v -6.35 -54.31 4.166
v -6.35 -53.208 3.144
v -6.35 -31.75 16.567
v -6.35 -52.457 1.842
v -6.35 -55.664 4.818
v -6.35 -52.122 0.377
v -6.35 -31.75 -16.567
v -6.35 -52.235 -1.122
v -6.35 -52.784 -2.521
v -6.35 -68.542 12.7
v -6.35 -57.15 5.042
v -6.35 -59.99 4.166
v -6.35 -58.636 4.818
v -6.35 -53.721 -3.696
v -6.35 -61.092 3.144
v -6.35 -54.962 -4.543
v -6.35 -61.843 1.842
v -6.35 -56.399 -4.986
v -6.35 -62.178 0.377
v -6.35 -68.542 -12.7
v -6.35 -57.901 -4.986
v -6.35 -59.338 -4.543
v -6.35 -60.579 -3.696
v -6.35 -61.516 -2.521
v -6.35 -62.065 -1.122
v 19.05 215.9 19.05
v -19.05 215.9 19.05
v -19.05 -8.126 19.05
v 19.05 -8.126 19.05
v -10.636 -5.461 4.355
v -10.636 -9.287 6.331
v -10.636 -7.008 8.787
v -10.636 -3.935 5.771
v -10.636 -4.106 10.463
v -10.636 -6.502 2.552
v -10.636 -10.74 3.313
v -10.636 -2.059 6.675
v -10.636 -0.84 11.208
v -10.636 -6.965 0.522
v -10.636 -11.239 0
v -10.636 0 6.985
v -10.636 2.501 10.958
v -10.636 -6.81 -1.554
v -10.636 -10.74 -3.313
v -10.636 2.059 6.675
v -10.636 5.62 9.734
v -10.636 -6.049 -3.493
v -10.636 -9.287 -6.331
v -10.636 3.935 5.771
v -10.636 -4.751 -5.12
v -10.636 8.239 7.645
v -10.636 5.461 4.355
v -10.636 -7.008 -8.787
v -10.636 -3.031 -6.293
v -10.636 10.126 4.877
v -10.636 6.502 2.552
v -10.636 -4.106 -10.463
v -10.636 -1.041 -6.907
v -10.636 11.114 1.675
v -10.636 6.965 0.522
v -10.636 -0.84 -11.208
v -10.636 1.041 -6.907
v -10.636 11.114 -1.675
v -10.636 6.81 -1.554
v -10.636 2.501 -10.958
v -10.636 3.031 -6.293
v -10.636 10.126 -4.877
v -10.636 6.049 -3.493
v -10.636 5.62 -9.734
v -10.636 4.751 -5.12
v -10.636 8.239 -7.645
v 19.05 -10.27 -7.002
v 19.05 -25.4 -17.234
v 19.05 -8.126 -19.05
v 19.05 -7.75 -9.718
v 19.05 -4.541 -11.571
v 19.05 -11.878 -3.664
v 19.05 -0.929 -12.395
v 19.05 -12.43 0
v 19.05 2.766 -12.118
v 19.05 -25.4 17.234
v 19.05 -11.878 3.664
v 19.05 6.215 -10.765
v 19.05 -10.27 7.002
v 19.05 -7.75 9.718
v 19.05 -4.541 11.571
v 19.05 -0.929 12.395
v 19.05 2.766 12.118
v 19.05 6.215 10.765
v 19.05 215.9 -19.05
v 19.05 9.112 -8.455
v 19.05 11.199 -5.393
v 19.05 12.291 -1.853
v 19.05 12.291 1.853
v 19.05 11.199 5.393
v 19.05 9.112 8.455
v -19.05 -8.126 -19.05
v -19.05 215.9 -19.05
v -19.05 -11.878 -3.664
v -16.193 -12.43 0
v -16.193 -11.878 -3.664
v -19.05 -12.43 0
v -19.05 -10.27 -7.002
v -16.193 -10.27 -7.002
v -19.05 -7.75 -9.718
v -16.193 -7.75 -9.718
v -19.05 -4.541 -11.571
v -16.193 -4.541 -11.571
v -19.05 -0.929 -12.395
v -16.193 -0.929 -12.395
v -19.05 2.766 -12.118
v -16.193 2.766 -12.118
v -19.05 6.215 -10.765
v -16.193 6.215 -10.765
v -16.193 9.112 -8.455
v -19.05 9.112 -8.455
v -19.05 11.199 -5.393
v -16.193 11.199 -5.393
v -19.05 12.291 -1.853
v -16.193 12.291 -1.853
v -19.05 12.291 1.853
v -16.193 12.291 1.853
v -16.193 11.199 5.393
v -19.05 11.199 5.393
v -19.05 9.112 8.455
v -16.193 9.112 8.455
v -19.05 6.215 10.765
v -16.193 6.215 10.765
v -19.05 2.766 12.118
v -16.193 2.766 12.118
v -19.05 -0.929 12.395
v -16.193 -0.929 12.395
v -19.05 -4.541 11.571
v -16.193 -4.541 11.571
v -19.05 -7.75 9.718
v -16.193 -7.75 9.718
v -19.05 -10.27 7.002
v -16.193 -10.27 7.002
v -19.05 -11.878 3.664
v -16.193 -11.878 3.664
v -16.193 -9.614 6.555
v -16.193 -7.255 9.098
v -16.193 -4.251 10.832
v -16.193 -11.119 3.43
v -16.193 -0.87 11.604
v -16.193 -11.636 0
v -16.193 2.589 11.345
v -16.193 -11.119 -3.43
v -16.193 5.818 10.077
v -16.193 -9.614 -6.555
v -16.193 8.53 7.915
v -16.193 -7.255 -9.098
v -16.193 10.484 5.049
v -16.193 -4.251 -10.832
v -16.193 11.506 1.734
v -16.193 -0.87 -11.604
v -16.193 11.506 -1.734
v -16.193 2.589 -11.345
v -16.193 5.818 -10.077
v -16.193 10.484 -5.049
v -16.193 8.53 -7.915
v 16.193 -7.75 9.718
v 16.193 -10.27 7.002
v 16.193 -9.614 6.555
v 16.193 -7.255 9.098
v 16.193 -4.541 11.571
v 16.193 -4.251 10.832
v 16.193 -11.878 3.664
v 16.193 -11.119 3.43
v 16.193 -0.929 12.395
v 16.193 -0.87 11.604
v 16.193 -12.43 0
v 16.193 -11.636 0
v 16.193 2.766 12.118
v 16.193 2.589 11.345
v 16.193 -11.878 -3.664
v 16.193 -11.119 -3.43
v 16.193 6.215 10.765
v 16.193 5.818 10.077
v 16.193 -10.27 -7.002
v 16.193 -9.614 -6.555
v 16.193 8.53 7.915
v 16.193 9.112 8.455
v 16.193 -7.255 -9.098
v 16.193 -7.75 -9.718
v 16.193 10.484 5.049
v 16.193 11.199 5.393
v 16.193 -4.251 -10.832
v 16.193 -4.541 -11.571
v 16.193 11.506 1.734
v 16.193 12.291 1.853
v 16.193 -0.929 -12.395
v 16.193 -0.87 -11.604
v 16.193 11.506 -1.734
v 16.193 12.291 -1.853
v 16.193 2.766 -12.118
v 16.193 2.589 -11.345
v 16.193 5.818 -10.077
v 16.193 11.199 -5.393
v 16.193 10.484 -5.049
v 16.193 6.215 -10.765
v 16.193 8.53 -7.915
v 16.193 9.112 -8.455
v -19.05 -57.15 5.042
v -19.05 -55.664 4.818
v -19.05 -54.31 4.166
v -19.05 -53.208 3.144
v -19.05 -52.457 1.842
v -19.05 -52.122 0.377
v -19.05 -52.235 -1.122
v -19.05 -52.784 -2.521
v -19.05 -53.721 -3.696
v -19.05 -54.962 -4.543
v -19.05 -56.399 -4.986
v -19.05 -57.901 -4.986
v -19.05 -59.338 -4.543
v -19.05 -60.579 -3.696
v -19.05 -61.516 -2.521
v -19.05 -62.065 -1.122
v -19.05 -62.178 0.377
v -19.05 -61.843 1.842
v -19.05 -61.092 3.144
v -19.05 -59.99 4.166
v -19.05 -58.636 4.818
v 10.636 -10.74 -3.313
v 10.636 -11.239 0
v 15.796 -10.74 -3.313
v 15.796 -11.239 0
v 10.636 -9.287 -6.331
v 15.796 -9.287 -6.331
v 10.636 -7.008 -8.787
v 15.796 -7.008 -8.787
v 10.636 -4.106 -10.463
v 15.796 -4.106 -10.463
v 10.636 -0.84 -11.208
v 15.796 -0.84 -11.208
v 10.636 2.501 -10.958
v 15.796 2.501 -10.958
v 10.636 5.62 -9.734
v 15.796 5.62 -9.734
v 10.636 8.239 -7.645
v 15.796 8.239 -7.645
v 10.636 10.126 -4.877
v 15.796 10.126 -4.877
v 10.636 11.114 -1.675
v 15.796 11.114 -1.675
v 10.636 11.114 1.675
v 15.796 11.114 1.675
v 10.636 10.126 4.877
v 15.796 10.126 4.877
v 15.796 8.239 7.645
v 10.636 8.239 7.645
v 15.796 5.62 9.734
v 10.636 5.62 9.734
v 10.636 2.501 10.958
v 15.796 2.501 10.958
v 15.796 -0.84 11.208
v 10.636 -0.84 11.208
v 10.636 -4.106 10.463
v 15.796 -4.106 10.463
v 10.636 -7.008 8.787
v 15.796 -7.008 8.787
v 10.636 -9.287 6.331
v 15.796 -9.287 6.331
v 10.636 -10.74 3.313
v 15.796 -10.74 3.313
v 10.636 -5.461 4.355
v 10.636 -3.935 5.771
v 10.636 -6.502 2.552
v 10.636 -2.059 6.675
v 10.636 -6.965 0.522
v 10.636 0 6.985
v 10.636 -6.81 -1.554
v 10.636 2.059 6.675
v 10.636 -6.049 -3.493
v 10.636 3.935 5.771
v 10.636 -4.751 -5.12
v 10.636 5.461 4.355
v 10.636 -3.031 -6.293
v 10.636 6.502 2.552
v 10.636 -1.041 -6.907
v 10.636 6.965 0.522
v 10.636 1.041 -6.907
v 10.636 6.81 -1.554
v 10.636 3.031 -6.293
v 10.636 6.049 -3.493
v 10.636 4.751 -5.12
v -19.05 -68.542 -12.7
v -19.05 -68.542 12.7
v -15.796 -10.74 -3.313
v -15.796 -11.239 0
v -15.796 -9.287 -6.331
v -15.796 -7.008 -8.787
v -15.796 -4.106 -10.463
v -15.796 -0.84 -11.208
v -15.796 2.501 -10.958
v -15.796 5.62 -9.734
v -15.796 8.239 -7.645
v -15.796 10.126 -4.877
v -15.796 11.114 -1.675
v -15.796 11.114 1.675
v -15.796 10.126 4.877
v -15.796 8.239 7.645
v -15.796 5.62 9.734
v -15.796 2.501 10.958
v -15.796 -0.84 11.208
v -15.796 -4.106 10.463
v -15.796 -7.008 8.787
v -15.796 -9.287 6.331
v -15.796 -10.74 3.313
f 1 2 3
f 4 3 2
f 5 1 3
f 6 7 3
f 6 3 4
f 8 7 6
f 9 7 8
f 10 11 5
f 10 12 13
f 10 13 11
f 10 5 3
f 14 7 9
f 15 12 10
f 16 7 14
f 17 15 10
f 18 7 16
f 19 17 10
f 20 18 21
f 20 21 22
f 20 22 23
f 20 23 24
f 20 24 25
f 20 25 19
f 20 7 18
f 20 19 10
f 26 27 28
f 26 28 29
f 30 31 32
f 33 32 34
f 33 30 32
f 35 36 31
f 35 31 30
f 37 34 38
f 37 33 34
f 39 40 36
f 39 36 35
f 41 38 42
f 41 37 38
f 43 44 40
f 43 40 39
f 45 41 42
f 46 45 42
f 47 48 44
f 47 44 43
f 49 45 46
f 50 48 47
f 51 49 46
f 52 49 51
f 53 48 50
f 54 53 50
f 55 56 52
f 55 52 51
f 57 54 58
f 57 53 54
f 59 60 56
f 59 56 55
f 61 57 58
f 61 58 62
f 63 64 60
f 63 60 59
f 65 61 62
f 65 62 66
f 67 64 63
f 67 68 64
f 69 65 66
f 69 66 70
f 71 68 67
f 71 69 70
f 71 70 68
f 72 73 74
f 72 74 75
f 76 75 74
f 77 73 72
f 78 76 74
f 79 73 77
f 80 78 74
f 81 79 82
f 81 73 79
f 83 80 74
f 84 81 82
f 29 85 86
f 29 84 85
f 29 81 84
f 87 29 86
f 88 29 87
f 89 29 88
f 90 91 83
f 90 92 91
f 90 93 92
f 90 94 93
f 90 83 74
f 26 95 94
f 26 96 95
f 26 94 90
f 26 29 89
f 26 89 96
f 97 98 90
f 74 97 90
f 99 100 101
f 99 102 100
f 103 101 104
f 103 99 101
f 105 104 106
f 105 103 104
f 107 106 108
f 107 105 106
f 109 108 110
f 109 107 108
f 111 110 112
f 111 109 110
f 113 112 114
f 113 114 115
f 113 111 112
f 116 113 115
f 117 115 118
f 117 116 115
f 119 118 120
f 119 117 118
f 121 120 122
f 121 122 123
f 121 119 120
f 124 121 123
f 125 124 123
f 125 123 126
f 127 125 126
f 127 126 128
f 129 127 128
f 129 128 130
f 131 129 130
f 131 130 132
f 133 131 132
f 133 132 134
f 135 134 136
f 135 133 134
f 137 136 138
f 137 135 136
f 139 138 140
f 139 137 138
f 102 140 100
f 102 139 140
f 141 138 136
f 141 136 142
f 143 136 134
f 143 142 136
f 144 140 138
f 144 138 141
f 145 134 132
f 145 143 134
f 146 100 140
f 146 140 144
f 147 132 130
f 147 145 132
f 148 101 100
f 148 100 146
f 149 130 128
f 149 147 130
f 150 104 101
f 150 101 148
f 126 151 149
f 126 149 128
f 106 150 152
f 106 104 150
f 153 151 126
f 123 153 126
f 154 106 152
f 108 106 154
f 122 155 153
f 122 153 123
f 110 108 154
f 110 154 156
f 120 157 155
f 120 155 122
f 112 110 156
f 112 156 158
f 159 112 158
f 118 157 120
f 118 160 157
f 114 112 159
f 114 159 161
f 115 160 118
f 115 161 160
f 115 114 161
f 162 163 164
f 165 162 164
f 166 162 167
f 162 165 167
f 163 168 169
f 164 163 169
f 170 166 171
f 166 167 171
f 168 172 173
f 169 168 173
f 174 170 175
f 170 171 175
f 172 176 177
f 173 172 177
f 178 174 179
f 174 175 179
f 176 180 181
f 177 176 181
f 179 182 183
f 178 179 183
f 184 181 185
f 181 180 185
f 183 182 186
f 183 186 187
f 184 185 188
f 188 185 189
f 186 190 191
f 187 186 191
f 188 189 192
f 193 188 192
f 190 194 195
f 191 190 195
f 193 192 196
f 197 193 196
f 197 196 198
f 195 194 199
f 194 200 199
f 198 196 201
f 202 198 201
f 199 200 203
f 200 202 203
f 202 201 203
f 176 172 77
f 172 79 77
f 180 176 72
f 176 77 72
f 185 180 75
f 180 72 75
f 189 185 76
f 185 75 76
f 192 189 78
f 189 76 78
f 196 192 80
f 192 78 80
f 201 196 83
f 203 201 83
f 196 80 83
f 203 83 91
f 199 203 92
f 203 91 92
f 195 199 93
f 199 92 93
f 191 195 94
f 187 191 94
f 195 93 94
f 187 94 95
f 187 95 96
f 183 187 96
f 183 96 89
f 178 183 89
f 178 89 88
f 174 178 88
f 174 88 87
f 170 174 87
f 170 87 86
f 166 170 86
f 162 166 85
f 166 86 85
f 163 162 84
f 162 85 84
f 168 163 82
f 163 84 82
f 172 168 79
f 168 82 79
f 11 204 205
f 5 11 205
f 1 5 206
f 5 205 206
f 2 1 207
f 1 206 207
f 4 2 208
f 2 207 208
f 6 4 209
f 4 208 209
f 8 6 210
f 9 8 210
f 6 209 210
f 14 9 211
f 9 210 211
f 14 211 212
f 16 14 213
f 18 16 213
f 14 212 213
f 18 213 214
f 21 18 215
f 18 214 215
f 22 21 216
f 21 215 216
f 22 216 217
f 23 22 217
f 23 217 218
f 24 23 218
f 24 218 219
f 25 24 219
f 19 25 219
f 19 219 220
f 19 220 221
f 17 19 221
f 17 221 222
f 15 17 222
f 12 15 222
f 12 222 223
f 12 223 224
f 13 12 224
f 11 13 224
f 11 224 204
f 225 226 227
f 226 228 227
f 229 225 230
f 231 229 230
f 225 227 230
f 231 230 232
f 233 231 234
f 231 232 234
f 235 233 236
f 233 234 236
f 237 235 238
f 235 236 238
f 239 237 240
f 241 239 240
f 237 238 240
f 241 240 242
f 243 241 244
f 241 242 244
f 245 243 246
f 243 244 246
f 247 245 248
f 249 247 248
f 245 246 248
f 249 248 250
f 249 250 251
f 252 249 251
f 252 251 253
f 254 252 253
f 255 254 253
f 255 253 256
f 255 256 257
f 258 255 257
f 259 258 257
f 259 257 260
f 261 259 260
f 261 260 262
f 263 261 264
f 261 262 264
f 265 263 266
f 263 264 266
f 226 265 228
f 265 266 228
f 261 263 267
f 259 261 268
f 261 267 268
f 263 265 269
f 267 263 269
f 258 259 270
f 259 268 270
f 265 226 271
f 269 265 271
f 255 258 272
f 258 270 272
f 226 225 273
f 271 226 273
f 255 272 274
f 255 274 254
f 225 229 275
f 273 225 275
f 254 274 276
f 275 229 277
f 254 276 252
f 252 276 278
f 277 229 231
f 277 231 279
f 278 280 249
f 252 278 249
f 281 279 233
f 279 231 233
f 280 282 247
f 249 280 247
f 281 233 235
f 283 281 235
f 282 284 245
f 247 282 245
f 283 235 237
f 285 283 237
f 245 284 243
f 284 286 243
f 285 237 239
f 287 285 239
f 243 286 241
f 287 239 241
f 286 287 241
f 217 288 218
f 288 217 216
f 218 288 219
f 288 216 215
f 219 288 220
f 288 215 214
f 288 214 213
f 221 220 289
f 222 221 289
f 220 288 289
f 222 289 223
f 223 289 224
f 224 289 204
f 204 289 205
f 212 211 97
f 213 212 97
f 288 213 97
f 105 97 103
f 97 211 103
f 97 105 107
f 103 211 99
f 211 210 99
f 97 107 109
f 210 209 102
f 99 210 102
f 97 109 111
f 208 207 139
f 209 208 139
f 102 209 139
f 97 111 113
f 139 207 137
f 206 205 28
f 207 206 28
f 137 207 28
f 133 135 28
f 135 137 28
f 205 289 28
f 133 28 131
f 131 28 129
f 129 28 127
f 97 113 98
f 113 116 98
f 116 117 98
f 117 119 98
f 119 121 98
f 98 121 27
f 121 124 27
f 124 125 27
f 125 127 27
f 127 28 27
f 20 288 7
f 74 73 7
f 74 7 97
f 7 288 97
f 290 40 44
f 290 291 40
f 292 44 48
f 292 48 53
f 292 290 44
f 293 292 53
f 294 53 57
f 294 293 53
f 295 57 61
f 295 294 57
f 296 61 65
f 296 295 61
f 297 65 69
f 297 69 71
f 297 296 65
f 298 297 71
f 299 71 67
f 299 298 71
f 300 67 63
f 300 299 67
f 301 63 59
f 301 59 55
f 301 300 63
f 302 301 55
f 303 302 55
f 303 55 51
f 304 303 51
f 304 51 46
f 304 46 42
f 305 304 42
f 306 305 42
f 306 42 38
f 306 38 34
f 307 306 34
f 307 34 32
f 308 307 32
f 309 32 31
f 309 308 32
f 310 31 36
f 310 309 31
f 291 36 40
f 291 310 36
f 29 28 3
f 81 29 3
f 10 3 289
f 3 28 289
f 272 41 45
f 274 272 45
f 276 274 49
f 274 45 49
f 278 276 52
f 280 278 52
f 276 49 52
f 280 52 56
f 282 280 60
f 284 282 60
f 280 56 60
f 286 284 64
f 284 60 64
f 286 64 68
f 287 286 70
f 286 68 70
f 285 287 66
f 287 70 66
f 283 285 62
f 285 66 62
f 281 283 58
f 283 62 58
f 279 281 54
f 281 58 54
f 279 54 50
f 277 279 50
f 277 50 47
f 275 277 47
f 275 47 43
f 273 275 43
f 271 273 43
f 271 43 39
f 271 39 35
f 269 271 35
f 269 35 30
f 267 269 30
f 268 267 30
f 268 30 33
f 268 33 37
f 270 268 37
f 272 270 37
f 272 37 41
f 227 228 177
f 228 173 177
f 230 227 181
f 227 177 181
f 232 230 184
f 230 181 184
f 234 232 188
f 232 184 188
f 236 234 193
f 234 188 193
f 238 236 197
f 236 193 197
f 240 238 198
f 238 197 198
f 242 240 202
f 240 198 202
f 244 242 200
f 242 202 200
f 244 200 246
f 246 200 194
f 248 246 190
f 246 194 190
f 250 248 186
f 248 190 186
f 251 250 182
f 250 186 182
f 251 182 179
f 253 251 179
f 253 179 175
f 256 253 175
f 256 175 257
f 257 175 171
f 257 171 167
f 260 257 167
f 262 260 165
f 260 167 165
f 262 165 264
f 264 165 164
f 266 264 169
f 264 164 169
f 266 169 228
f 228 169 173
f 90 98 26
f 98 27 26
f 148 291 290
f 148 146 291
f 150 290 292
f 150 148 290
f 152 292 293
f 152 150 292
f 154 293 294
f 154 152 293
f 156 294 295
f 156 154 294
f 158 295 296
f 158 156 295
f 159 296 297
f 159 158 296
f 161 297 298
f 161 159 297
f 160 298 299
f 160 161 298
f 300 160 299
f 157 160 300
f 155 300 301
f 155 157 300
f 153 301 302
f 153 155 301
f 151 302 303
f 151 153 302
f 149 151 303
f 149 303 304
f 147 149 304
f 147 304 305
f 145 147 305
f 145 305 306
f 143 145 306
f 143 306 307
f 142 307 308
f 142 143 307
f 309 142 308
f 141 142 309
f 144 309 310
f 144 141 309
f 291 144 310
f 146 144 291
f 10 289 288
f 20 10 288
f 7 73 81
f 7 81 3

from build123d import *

# Parameters (mm, degrees)
SKETCH5_W               = 38.1
SKETCH5_H               = 298.45
BOSS_EXTRUDE2_DEPTH     = 19.05
F_3_8_CLEARANCE_HOLE2_D = 10.0838
F_3_8_CLEARANCE_HOLE4_D = 13.97
BODY_MOVE_COPY4_ANGLE   = 90
CUT_EXTRUDE1_DEPTH      = 218.574389578
CUT_EXTRUDE1_DEPTH_BACK = 218.574389578
CUT_EXTRUDE5_DEPTH      = 218.574389578
CUT_EXTRUDE5_DEPTH_BACK = 218.574389578


with BuildPart() as part:
    # Sketch5 → Boss-Extrude2 (new, symmetric)
    with BuildSketch(Plane.XY):
        with Locations((0, 66.675)):
            Rectangle(SKETCH5_W, SKETCH5_H)
    extrude(amount=BOSS_EXTRUDE2_DEPTH, both=True)

    # 3/8 Clearance Hole2 (through all)
    with Locations(Plane(origin=(19.05, 0, 0), x_dir=(0, 0, -1), z_dir=(1, 0, 0))):
        with Locations((0, -57.15)):
            Hole(F_3_8_CLEARANCE_HOLE2_D / 2)

    # 3/8 Clearance Hole4 (through all)
    with Locations(Plane(origin=(19.05, 0, 0), x_dir=(0, 0, -1), z_dir=(1, 0, 0))):
        with Locations((0, 0)):
            Hole(F_3_8_CLEARANCE_HOLE4_D / 2)


with BuildPart() as body_2:
    # uxcell-FR6ZZ: read off the stored shape, not the designer's step
    # uxcell-FR6ZZ outline → uxcell-FR6ZZ (revolve)
    with BuildSketch(Plane(origin=(46.870492888, 0, -67.456601715), x_dir=(1, 0, 0), z_dir=(0, 0, 1))):
        Polygon((12.430125, 146.229545606), (4.7625, 146.229545606), (4.7625, 137.815795606), (11.2395, 137.815795606), (11.2395, 142.975170606), (11.636375, 143.372045606), (12.430125, 143.372045606), align=None)
    revolve(axis=Axis((46.870492888, 0, -67.456601715), (0, 1, 0)))


with BuildPart() as body_2_1:
    # Body-Move/Copy4: read off the stored shape, not the designer's step
    # Body-Move/Copy4: moved
    add(body_2.part.moved(Location((-46.8704929, -127.1795456, 67.4566017))).rotate(Axis((0, 0, 0), (0, 0, -1)), BODY_MOVE_COPY4_ANGLE))


with BuildPart() as body_3:
    # Mirror1: mirrored copy
    add(body_2_1.part.mirror(Plane(origin=(0, 0, 0), x_dir=(0, 0, 1), z_dir=(1, 0, 0))))


with BuildPart() as part_1:
    add(part.part)

    # Combine2: cut body 3, body 2
    add(body_3.part, mode=Mode.SUBTRACT)
    add(body_2_1.part, mode=Mode.SUBTRACT)

    # Sketch11 → Cut-Extrude1 (cut, two sides: drawn at the far end of the back side and taken through both)
    with BuildSketch(Plane.XY.offset(-CUT_EXTRUDE1_DEPTH_BACK)):
        Polygon((-6.35, -691.607801887), (-6.35, -82.55), (-6.35, -31.75), (19.05, -25.4), (609.922858655, 122.318214664), (1581.067185153, -612.994182394), (964.794326498, -1426.920198945), align=None)
    extrude(amount=CUT_EXTRUDE1_DEPTH + CUT_EXTRUDE1_DEPTH_BACK, mode=Mode.SUBTRACT)

    # Sketch18 → Cut-Extrude5 (cut, two sides: drawn at the far end of the back side and taken through both)
    with BuildSketch(Plane(origin=(0, 0, 0), x_dir=(0, 0, -1), z_dir=(1, 0, 0)).offset(-CUT_EXTRUDE5_DEPTH_BACK)):
        Polygon((-67.601886726, 453.814659538), (-19.05, -8.125685716), (-12.7, -68.5419), (12.7, -68.5419), (19.05, -8.125685716), (67.601886726, 453.814659538), (67.601886726, -475.155024096), (-67.601886726, -475.155024096), align=None)
    extrude(amount=CUT_EXTRUDE5_DEPTH + CUT_EXTRUDE5_DEPTH_BACK, mode=Mode.SUBTRACT)


solid = part_1.part
